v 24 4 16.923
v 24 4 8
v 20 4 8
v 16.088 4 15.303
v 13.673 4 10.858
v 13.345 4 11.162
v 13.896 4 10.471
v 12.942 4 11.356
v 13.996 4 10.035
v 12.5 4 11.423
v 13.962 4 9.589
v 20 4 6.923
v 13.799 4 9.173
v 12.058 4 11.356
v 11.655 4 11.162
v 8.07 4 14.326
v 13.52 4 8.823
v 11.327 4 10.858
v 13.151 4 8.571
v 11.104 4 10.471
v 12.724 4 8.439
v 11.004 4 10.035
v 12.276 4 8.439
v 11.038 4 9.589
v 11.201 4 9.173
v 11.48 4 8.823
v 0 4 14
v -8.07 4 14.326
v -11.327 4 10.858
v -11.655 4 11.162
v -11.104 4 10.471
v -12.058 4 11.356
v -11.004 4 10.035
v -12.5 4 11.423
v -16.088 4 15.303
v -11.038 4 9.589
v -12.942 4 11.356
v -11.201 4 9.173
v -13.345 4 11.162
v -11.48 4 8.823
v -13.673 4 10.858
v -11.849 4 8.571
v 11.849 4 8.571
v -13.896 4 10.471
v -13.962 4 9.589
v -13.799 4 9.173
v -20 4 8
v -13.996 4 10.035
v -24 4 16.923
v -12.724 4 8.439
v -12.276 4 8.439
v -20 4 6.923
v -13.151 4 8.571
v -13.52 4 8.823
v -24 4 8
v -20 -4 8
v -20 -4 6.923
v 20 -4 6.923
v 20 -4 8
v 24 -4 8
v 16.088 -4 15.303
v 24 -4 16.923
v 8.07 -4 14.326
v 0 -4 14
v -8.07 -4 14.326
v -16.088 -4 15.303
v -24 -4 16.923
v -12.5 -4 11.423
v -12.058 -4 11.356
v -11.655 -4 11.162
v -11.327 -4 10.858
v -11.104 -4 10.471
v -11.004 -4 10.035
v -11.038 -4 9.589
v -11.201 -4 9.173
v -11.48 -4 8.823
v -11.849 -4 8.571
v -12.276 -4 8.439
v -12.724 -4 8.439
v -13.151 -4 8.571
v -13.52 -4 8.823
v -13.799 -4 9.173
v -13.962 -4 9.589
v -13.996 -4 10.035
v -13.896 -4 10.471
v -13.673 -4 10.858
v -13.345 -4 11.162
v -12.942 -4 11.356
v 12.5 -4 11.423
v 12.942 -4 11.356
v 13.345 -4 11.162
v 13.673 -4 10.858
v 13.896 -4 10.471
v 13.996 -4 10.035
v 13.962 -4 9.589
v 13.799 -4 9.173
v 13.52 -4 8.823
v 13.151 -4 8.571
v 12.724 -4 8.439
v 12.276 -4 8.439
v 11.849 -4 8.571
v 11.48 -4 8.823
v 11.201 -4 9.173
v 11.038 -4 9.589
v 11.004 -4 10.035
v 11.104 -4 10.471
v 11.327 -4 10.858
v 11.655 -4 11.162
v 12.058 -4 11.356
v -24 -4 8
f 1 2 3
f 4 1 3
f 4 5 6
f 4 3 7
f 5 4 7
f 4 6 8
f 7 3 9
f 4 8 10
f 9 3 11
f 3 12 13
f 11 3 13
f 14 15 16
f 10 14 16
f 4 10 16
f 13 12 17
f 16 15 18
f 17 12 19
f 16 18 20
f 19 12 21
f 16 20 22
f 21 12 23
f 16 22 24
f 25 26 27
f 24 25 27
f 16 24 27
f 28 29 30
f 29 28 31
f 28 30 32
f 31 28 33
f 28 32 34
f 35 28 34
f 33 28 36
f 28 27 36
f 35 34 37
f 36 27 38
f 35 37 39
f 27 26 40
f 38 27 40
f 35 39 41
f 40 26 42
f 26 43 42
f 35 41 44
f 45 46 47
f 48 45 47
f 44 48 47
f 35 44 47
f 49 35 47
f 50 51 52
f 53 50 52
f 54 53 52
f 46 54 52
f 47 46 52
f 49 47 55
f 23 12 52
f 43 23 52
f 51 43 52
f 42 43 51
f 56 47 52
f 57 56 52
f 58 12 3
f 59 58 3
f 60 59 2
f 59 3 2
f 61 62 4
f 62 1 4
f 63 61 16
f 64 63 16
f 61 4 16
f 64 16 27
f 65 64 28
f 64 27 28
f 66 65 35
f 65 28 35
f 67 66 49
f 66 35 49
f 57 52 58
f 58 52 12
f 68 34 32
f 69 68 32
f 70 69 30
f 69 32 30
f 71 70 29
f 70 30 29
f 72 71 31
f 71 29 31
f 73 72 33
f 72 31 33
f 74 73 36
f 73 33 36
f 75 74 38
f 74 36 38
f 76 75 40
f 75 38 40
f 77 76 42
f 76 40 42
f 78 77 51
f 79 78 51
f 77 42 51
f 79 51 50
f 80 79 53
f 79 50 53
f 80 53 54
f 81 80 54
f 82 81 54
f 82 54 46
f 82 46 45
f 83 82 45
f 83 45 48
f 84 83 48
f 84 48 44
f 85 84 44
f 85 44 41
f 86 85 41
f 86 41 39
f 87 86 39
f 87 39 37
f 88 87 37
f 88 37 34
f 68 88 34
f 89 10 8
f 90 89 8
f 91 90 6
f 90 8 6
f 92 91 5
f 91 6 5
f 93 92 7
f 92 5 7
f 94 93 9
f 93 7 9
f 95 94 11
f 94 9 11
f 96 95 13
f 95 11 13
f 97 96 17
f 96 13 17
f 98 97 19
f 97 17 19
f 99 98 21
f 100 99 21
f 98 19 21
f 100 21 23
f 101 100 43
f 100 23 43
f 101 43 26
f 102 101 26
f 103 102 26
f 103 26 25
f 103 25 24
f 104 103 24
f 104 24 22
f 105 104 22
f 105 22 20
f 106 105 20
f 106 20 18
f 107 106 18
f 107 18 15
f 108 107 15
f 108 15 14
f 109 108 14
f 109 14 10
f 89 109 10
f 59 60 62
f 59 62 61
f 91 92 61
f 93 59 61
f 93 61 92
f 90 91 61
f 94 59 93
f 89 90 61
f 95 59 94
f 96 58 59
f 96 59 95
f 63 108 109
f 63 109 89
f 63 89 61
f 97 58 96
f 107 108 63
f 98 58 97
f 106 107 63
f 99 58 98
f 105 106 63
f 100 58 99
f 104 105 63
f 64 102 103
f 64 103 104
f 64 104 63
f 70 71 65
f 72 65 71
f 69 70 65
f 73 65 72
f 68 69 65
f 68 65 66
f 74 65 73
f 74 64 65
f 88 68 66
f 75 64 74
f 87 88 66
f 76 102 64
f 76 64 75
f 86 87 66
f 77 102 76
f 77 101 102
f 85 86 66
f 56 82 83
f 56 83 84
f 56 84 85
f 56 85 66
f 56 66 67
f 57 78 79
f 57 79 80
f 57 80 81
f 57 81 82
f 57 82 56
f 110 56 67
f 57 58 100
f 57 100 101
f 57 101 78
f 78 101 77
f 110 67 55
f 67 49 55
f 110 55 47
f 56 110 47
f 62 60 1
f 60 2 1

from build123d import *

# Parameters (mm, degrees)
BOSS_EXTRUDE1_DEPTH = 4
SKETCH10_R          = 1.5
SKETCH10_W          = 40
SKETCH10_H          = 6.922711204
CUT_EXTRUDE2_DEPTH  = 31.436460939


with BuildPart() as part:
    # Sketch1 → Boss-Extrude1 (new, symmetric)
    with BuildSketch(Plane(origin=(0, 0, 0), x_dir=(1, 0, 0), z_dir=(0, 1, 0))):
        with BuildLine():
            Line((-20, 0), (0, 0))
            Line((0, 0), (20, 0))
            Line((20, 0), (20, -8))
            Line((20, -8), (24, -8))
            Line((24, -8), (24, -16.922711204))
            ThreePointArc((24, -16.922711204), (0, -14), (-24, -16.922711204))
            Line((-24, -16.922711204), (-24, -8))
            Line((-24, -8), (-20, -8))
            Line((-20, -8), (-20, 0))
        make_face()
    extrude(amount=BOSS_EXTRUDE1_DEPTH, both=True)

    # Sketch10 → Cut-Extrude2 (cut, through all)
    with BuildSketch(Plane(origin=(0, 4, 0), x_dir=(1, 0, 0), z_dir=(0, 1, 0))):
        with Locations(Location((-12.5, -9.922711204, 0), (0, 0, 270))):
            Circle(SKETCH10_R)
        with Locations(Location((12.5, -9.922711204, 0), (0, 0, 270))):
            Circle(SKETCH10_R)
        with Locations((0, -3.461355602)):
            Rectangle(SKETCH10_W, SKETCH10_H)
    extrude(amount=-CUT_EXTRUDE2_DEPTH, mode=Mode.SUBTRACT)


solid = part.part
